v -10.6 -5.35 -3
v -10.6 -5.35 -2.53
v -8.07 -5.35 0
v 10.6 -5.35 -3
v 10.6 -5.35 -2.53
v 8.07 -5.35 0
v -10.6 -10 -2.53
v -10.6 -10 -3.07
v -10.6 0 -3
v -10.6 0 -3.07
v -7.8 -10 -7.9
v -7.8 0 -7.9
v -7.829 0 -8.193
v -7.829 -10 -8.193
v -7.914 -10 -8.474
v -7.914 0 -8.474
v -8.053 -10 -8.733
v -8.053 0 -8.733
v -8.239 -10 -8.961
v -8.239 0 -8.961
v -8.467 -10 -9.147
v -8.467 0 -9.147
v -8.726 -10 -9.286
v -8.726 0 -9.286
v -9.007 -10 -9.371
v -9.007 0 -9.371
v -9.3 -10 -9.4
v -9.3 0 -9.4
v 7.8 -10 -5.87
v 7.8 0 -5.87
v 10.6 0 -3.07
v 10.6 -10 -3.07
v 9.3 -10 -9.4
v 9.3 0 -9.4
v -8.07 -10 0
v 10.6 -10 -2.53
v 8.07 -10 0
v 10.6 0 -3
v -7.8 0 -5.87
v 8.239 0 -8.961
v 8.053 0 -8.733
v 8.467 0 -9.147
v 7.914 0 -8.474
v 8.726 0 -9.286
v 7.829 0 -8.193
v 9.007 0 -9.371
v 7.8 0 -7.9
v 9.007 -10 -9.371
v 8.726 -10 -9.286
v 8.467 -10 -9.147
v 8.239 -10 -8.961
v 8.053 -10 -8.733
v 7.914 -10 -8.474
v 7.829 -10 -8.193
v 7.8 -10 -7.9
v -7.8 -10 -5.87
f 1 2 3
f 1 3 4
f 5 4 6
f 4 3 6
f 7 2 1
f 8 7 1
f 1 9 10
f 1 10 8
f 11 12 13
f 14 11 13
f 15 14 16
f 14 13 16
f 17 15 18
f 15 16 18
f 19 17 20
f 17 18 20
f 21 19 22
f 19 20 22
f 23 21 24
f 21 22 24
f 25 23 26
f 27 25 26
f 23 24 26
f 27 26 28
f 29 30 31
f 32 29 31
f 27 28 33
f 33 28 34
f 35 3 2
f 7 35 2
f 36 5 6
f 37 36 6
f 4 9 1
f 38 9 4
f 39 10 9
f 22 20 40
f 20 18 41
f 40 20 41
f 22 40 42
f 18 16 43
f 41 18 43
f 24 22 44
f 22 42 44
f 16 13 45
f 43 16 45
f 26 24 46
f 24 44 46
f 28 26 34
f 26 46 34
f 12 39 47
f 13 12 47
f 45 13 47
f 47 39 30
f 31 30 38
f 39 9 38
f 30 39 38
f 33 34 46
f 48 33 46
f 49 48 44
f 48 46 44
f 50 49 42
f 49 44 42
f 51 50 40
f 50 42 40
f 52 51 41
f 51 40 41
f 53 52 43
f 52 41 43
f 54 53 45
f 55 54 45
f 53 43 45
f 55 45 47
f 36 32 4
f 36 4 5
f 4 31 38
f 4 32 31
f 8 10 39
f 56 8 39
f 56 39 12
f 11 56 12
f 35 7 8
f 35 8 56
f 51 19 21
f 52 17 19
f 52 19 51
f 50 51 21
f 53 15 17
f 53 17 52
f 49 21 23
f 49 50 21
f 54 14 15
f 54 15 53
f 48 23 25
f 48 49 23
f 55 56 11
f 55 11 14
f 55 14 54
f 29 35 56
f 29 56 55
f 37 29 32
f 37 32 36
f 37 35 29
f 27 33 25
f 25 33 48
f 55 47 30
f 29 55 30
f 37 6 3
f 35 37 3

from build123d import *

# Parameters (mm, degrees)
F1_DEPTH = 10
F2_W     = 21.2
F2_H     = 3
F3_DEPTH = 5.35


with BuildPart() as f1:
    # F0 (on Front) → F1 (new body)
    with BuildSketch(Plane.XZ):
        with BuildLine():
            Line((-10.6, -2.53), (-10.6, -3.07))
            Line((-10.6, -3.07), (-7.8, -5.87))
            Line((-7.8, -5.87), (-7.8, -7.9))
            ThreePointArc((-7.8, -7.9), (-8.23934, -8.96066), (-9.3, -9.4))
            Line((-9.3, -9.4), (9.3, -9.4))
            ThreePointArc((9.3, -9.4), (8.23934, -8.96066), (7.8, -7.9))
            Line((7.8, -7.9), (7.8, -5.87))
            Line((7.8, -5.87), (10.6, -3.07))
            Line((10.6, -3.07), (10.6, -2.53))
            Line((10.6, -2.53), (8.07, 0))
            Line((8.07, 0), (-8.07, 0))
            Line((-8.07, 0), (-10.6, -2.53))
        make_face()
    extrude(amount=F1_DEPTH)


with BuildPart() as f3:
    # F2 (on Front) → F3 (new body)
    with BuildSketch(Plane.XZ):
        with Locations((0, -1.5)):
            Rectangle(F2_W, F2_H)
    extrude(amount=F3_DEPTH)


with BuildPart() as f1_1:
    add(f1.part)

    # F4: cut F3
    add(f3.part, mode=Mode.SUBTRACT)


solid = f1_1.part
